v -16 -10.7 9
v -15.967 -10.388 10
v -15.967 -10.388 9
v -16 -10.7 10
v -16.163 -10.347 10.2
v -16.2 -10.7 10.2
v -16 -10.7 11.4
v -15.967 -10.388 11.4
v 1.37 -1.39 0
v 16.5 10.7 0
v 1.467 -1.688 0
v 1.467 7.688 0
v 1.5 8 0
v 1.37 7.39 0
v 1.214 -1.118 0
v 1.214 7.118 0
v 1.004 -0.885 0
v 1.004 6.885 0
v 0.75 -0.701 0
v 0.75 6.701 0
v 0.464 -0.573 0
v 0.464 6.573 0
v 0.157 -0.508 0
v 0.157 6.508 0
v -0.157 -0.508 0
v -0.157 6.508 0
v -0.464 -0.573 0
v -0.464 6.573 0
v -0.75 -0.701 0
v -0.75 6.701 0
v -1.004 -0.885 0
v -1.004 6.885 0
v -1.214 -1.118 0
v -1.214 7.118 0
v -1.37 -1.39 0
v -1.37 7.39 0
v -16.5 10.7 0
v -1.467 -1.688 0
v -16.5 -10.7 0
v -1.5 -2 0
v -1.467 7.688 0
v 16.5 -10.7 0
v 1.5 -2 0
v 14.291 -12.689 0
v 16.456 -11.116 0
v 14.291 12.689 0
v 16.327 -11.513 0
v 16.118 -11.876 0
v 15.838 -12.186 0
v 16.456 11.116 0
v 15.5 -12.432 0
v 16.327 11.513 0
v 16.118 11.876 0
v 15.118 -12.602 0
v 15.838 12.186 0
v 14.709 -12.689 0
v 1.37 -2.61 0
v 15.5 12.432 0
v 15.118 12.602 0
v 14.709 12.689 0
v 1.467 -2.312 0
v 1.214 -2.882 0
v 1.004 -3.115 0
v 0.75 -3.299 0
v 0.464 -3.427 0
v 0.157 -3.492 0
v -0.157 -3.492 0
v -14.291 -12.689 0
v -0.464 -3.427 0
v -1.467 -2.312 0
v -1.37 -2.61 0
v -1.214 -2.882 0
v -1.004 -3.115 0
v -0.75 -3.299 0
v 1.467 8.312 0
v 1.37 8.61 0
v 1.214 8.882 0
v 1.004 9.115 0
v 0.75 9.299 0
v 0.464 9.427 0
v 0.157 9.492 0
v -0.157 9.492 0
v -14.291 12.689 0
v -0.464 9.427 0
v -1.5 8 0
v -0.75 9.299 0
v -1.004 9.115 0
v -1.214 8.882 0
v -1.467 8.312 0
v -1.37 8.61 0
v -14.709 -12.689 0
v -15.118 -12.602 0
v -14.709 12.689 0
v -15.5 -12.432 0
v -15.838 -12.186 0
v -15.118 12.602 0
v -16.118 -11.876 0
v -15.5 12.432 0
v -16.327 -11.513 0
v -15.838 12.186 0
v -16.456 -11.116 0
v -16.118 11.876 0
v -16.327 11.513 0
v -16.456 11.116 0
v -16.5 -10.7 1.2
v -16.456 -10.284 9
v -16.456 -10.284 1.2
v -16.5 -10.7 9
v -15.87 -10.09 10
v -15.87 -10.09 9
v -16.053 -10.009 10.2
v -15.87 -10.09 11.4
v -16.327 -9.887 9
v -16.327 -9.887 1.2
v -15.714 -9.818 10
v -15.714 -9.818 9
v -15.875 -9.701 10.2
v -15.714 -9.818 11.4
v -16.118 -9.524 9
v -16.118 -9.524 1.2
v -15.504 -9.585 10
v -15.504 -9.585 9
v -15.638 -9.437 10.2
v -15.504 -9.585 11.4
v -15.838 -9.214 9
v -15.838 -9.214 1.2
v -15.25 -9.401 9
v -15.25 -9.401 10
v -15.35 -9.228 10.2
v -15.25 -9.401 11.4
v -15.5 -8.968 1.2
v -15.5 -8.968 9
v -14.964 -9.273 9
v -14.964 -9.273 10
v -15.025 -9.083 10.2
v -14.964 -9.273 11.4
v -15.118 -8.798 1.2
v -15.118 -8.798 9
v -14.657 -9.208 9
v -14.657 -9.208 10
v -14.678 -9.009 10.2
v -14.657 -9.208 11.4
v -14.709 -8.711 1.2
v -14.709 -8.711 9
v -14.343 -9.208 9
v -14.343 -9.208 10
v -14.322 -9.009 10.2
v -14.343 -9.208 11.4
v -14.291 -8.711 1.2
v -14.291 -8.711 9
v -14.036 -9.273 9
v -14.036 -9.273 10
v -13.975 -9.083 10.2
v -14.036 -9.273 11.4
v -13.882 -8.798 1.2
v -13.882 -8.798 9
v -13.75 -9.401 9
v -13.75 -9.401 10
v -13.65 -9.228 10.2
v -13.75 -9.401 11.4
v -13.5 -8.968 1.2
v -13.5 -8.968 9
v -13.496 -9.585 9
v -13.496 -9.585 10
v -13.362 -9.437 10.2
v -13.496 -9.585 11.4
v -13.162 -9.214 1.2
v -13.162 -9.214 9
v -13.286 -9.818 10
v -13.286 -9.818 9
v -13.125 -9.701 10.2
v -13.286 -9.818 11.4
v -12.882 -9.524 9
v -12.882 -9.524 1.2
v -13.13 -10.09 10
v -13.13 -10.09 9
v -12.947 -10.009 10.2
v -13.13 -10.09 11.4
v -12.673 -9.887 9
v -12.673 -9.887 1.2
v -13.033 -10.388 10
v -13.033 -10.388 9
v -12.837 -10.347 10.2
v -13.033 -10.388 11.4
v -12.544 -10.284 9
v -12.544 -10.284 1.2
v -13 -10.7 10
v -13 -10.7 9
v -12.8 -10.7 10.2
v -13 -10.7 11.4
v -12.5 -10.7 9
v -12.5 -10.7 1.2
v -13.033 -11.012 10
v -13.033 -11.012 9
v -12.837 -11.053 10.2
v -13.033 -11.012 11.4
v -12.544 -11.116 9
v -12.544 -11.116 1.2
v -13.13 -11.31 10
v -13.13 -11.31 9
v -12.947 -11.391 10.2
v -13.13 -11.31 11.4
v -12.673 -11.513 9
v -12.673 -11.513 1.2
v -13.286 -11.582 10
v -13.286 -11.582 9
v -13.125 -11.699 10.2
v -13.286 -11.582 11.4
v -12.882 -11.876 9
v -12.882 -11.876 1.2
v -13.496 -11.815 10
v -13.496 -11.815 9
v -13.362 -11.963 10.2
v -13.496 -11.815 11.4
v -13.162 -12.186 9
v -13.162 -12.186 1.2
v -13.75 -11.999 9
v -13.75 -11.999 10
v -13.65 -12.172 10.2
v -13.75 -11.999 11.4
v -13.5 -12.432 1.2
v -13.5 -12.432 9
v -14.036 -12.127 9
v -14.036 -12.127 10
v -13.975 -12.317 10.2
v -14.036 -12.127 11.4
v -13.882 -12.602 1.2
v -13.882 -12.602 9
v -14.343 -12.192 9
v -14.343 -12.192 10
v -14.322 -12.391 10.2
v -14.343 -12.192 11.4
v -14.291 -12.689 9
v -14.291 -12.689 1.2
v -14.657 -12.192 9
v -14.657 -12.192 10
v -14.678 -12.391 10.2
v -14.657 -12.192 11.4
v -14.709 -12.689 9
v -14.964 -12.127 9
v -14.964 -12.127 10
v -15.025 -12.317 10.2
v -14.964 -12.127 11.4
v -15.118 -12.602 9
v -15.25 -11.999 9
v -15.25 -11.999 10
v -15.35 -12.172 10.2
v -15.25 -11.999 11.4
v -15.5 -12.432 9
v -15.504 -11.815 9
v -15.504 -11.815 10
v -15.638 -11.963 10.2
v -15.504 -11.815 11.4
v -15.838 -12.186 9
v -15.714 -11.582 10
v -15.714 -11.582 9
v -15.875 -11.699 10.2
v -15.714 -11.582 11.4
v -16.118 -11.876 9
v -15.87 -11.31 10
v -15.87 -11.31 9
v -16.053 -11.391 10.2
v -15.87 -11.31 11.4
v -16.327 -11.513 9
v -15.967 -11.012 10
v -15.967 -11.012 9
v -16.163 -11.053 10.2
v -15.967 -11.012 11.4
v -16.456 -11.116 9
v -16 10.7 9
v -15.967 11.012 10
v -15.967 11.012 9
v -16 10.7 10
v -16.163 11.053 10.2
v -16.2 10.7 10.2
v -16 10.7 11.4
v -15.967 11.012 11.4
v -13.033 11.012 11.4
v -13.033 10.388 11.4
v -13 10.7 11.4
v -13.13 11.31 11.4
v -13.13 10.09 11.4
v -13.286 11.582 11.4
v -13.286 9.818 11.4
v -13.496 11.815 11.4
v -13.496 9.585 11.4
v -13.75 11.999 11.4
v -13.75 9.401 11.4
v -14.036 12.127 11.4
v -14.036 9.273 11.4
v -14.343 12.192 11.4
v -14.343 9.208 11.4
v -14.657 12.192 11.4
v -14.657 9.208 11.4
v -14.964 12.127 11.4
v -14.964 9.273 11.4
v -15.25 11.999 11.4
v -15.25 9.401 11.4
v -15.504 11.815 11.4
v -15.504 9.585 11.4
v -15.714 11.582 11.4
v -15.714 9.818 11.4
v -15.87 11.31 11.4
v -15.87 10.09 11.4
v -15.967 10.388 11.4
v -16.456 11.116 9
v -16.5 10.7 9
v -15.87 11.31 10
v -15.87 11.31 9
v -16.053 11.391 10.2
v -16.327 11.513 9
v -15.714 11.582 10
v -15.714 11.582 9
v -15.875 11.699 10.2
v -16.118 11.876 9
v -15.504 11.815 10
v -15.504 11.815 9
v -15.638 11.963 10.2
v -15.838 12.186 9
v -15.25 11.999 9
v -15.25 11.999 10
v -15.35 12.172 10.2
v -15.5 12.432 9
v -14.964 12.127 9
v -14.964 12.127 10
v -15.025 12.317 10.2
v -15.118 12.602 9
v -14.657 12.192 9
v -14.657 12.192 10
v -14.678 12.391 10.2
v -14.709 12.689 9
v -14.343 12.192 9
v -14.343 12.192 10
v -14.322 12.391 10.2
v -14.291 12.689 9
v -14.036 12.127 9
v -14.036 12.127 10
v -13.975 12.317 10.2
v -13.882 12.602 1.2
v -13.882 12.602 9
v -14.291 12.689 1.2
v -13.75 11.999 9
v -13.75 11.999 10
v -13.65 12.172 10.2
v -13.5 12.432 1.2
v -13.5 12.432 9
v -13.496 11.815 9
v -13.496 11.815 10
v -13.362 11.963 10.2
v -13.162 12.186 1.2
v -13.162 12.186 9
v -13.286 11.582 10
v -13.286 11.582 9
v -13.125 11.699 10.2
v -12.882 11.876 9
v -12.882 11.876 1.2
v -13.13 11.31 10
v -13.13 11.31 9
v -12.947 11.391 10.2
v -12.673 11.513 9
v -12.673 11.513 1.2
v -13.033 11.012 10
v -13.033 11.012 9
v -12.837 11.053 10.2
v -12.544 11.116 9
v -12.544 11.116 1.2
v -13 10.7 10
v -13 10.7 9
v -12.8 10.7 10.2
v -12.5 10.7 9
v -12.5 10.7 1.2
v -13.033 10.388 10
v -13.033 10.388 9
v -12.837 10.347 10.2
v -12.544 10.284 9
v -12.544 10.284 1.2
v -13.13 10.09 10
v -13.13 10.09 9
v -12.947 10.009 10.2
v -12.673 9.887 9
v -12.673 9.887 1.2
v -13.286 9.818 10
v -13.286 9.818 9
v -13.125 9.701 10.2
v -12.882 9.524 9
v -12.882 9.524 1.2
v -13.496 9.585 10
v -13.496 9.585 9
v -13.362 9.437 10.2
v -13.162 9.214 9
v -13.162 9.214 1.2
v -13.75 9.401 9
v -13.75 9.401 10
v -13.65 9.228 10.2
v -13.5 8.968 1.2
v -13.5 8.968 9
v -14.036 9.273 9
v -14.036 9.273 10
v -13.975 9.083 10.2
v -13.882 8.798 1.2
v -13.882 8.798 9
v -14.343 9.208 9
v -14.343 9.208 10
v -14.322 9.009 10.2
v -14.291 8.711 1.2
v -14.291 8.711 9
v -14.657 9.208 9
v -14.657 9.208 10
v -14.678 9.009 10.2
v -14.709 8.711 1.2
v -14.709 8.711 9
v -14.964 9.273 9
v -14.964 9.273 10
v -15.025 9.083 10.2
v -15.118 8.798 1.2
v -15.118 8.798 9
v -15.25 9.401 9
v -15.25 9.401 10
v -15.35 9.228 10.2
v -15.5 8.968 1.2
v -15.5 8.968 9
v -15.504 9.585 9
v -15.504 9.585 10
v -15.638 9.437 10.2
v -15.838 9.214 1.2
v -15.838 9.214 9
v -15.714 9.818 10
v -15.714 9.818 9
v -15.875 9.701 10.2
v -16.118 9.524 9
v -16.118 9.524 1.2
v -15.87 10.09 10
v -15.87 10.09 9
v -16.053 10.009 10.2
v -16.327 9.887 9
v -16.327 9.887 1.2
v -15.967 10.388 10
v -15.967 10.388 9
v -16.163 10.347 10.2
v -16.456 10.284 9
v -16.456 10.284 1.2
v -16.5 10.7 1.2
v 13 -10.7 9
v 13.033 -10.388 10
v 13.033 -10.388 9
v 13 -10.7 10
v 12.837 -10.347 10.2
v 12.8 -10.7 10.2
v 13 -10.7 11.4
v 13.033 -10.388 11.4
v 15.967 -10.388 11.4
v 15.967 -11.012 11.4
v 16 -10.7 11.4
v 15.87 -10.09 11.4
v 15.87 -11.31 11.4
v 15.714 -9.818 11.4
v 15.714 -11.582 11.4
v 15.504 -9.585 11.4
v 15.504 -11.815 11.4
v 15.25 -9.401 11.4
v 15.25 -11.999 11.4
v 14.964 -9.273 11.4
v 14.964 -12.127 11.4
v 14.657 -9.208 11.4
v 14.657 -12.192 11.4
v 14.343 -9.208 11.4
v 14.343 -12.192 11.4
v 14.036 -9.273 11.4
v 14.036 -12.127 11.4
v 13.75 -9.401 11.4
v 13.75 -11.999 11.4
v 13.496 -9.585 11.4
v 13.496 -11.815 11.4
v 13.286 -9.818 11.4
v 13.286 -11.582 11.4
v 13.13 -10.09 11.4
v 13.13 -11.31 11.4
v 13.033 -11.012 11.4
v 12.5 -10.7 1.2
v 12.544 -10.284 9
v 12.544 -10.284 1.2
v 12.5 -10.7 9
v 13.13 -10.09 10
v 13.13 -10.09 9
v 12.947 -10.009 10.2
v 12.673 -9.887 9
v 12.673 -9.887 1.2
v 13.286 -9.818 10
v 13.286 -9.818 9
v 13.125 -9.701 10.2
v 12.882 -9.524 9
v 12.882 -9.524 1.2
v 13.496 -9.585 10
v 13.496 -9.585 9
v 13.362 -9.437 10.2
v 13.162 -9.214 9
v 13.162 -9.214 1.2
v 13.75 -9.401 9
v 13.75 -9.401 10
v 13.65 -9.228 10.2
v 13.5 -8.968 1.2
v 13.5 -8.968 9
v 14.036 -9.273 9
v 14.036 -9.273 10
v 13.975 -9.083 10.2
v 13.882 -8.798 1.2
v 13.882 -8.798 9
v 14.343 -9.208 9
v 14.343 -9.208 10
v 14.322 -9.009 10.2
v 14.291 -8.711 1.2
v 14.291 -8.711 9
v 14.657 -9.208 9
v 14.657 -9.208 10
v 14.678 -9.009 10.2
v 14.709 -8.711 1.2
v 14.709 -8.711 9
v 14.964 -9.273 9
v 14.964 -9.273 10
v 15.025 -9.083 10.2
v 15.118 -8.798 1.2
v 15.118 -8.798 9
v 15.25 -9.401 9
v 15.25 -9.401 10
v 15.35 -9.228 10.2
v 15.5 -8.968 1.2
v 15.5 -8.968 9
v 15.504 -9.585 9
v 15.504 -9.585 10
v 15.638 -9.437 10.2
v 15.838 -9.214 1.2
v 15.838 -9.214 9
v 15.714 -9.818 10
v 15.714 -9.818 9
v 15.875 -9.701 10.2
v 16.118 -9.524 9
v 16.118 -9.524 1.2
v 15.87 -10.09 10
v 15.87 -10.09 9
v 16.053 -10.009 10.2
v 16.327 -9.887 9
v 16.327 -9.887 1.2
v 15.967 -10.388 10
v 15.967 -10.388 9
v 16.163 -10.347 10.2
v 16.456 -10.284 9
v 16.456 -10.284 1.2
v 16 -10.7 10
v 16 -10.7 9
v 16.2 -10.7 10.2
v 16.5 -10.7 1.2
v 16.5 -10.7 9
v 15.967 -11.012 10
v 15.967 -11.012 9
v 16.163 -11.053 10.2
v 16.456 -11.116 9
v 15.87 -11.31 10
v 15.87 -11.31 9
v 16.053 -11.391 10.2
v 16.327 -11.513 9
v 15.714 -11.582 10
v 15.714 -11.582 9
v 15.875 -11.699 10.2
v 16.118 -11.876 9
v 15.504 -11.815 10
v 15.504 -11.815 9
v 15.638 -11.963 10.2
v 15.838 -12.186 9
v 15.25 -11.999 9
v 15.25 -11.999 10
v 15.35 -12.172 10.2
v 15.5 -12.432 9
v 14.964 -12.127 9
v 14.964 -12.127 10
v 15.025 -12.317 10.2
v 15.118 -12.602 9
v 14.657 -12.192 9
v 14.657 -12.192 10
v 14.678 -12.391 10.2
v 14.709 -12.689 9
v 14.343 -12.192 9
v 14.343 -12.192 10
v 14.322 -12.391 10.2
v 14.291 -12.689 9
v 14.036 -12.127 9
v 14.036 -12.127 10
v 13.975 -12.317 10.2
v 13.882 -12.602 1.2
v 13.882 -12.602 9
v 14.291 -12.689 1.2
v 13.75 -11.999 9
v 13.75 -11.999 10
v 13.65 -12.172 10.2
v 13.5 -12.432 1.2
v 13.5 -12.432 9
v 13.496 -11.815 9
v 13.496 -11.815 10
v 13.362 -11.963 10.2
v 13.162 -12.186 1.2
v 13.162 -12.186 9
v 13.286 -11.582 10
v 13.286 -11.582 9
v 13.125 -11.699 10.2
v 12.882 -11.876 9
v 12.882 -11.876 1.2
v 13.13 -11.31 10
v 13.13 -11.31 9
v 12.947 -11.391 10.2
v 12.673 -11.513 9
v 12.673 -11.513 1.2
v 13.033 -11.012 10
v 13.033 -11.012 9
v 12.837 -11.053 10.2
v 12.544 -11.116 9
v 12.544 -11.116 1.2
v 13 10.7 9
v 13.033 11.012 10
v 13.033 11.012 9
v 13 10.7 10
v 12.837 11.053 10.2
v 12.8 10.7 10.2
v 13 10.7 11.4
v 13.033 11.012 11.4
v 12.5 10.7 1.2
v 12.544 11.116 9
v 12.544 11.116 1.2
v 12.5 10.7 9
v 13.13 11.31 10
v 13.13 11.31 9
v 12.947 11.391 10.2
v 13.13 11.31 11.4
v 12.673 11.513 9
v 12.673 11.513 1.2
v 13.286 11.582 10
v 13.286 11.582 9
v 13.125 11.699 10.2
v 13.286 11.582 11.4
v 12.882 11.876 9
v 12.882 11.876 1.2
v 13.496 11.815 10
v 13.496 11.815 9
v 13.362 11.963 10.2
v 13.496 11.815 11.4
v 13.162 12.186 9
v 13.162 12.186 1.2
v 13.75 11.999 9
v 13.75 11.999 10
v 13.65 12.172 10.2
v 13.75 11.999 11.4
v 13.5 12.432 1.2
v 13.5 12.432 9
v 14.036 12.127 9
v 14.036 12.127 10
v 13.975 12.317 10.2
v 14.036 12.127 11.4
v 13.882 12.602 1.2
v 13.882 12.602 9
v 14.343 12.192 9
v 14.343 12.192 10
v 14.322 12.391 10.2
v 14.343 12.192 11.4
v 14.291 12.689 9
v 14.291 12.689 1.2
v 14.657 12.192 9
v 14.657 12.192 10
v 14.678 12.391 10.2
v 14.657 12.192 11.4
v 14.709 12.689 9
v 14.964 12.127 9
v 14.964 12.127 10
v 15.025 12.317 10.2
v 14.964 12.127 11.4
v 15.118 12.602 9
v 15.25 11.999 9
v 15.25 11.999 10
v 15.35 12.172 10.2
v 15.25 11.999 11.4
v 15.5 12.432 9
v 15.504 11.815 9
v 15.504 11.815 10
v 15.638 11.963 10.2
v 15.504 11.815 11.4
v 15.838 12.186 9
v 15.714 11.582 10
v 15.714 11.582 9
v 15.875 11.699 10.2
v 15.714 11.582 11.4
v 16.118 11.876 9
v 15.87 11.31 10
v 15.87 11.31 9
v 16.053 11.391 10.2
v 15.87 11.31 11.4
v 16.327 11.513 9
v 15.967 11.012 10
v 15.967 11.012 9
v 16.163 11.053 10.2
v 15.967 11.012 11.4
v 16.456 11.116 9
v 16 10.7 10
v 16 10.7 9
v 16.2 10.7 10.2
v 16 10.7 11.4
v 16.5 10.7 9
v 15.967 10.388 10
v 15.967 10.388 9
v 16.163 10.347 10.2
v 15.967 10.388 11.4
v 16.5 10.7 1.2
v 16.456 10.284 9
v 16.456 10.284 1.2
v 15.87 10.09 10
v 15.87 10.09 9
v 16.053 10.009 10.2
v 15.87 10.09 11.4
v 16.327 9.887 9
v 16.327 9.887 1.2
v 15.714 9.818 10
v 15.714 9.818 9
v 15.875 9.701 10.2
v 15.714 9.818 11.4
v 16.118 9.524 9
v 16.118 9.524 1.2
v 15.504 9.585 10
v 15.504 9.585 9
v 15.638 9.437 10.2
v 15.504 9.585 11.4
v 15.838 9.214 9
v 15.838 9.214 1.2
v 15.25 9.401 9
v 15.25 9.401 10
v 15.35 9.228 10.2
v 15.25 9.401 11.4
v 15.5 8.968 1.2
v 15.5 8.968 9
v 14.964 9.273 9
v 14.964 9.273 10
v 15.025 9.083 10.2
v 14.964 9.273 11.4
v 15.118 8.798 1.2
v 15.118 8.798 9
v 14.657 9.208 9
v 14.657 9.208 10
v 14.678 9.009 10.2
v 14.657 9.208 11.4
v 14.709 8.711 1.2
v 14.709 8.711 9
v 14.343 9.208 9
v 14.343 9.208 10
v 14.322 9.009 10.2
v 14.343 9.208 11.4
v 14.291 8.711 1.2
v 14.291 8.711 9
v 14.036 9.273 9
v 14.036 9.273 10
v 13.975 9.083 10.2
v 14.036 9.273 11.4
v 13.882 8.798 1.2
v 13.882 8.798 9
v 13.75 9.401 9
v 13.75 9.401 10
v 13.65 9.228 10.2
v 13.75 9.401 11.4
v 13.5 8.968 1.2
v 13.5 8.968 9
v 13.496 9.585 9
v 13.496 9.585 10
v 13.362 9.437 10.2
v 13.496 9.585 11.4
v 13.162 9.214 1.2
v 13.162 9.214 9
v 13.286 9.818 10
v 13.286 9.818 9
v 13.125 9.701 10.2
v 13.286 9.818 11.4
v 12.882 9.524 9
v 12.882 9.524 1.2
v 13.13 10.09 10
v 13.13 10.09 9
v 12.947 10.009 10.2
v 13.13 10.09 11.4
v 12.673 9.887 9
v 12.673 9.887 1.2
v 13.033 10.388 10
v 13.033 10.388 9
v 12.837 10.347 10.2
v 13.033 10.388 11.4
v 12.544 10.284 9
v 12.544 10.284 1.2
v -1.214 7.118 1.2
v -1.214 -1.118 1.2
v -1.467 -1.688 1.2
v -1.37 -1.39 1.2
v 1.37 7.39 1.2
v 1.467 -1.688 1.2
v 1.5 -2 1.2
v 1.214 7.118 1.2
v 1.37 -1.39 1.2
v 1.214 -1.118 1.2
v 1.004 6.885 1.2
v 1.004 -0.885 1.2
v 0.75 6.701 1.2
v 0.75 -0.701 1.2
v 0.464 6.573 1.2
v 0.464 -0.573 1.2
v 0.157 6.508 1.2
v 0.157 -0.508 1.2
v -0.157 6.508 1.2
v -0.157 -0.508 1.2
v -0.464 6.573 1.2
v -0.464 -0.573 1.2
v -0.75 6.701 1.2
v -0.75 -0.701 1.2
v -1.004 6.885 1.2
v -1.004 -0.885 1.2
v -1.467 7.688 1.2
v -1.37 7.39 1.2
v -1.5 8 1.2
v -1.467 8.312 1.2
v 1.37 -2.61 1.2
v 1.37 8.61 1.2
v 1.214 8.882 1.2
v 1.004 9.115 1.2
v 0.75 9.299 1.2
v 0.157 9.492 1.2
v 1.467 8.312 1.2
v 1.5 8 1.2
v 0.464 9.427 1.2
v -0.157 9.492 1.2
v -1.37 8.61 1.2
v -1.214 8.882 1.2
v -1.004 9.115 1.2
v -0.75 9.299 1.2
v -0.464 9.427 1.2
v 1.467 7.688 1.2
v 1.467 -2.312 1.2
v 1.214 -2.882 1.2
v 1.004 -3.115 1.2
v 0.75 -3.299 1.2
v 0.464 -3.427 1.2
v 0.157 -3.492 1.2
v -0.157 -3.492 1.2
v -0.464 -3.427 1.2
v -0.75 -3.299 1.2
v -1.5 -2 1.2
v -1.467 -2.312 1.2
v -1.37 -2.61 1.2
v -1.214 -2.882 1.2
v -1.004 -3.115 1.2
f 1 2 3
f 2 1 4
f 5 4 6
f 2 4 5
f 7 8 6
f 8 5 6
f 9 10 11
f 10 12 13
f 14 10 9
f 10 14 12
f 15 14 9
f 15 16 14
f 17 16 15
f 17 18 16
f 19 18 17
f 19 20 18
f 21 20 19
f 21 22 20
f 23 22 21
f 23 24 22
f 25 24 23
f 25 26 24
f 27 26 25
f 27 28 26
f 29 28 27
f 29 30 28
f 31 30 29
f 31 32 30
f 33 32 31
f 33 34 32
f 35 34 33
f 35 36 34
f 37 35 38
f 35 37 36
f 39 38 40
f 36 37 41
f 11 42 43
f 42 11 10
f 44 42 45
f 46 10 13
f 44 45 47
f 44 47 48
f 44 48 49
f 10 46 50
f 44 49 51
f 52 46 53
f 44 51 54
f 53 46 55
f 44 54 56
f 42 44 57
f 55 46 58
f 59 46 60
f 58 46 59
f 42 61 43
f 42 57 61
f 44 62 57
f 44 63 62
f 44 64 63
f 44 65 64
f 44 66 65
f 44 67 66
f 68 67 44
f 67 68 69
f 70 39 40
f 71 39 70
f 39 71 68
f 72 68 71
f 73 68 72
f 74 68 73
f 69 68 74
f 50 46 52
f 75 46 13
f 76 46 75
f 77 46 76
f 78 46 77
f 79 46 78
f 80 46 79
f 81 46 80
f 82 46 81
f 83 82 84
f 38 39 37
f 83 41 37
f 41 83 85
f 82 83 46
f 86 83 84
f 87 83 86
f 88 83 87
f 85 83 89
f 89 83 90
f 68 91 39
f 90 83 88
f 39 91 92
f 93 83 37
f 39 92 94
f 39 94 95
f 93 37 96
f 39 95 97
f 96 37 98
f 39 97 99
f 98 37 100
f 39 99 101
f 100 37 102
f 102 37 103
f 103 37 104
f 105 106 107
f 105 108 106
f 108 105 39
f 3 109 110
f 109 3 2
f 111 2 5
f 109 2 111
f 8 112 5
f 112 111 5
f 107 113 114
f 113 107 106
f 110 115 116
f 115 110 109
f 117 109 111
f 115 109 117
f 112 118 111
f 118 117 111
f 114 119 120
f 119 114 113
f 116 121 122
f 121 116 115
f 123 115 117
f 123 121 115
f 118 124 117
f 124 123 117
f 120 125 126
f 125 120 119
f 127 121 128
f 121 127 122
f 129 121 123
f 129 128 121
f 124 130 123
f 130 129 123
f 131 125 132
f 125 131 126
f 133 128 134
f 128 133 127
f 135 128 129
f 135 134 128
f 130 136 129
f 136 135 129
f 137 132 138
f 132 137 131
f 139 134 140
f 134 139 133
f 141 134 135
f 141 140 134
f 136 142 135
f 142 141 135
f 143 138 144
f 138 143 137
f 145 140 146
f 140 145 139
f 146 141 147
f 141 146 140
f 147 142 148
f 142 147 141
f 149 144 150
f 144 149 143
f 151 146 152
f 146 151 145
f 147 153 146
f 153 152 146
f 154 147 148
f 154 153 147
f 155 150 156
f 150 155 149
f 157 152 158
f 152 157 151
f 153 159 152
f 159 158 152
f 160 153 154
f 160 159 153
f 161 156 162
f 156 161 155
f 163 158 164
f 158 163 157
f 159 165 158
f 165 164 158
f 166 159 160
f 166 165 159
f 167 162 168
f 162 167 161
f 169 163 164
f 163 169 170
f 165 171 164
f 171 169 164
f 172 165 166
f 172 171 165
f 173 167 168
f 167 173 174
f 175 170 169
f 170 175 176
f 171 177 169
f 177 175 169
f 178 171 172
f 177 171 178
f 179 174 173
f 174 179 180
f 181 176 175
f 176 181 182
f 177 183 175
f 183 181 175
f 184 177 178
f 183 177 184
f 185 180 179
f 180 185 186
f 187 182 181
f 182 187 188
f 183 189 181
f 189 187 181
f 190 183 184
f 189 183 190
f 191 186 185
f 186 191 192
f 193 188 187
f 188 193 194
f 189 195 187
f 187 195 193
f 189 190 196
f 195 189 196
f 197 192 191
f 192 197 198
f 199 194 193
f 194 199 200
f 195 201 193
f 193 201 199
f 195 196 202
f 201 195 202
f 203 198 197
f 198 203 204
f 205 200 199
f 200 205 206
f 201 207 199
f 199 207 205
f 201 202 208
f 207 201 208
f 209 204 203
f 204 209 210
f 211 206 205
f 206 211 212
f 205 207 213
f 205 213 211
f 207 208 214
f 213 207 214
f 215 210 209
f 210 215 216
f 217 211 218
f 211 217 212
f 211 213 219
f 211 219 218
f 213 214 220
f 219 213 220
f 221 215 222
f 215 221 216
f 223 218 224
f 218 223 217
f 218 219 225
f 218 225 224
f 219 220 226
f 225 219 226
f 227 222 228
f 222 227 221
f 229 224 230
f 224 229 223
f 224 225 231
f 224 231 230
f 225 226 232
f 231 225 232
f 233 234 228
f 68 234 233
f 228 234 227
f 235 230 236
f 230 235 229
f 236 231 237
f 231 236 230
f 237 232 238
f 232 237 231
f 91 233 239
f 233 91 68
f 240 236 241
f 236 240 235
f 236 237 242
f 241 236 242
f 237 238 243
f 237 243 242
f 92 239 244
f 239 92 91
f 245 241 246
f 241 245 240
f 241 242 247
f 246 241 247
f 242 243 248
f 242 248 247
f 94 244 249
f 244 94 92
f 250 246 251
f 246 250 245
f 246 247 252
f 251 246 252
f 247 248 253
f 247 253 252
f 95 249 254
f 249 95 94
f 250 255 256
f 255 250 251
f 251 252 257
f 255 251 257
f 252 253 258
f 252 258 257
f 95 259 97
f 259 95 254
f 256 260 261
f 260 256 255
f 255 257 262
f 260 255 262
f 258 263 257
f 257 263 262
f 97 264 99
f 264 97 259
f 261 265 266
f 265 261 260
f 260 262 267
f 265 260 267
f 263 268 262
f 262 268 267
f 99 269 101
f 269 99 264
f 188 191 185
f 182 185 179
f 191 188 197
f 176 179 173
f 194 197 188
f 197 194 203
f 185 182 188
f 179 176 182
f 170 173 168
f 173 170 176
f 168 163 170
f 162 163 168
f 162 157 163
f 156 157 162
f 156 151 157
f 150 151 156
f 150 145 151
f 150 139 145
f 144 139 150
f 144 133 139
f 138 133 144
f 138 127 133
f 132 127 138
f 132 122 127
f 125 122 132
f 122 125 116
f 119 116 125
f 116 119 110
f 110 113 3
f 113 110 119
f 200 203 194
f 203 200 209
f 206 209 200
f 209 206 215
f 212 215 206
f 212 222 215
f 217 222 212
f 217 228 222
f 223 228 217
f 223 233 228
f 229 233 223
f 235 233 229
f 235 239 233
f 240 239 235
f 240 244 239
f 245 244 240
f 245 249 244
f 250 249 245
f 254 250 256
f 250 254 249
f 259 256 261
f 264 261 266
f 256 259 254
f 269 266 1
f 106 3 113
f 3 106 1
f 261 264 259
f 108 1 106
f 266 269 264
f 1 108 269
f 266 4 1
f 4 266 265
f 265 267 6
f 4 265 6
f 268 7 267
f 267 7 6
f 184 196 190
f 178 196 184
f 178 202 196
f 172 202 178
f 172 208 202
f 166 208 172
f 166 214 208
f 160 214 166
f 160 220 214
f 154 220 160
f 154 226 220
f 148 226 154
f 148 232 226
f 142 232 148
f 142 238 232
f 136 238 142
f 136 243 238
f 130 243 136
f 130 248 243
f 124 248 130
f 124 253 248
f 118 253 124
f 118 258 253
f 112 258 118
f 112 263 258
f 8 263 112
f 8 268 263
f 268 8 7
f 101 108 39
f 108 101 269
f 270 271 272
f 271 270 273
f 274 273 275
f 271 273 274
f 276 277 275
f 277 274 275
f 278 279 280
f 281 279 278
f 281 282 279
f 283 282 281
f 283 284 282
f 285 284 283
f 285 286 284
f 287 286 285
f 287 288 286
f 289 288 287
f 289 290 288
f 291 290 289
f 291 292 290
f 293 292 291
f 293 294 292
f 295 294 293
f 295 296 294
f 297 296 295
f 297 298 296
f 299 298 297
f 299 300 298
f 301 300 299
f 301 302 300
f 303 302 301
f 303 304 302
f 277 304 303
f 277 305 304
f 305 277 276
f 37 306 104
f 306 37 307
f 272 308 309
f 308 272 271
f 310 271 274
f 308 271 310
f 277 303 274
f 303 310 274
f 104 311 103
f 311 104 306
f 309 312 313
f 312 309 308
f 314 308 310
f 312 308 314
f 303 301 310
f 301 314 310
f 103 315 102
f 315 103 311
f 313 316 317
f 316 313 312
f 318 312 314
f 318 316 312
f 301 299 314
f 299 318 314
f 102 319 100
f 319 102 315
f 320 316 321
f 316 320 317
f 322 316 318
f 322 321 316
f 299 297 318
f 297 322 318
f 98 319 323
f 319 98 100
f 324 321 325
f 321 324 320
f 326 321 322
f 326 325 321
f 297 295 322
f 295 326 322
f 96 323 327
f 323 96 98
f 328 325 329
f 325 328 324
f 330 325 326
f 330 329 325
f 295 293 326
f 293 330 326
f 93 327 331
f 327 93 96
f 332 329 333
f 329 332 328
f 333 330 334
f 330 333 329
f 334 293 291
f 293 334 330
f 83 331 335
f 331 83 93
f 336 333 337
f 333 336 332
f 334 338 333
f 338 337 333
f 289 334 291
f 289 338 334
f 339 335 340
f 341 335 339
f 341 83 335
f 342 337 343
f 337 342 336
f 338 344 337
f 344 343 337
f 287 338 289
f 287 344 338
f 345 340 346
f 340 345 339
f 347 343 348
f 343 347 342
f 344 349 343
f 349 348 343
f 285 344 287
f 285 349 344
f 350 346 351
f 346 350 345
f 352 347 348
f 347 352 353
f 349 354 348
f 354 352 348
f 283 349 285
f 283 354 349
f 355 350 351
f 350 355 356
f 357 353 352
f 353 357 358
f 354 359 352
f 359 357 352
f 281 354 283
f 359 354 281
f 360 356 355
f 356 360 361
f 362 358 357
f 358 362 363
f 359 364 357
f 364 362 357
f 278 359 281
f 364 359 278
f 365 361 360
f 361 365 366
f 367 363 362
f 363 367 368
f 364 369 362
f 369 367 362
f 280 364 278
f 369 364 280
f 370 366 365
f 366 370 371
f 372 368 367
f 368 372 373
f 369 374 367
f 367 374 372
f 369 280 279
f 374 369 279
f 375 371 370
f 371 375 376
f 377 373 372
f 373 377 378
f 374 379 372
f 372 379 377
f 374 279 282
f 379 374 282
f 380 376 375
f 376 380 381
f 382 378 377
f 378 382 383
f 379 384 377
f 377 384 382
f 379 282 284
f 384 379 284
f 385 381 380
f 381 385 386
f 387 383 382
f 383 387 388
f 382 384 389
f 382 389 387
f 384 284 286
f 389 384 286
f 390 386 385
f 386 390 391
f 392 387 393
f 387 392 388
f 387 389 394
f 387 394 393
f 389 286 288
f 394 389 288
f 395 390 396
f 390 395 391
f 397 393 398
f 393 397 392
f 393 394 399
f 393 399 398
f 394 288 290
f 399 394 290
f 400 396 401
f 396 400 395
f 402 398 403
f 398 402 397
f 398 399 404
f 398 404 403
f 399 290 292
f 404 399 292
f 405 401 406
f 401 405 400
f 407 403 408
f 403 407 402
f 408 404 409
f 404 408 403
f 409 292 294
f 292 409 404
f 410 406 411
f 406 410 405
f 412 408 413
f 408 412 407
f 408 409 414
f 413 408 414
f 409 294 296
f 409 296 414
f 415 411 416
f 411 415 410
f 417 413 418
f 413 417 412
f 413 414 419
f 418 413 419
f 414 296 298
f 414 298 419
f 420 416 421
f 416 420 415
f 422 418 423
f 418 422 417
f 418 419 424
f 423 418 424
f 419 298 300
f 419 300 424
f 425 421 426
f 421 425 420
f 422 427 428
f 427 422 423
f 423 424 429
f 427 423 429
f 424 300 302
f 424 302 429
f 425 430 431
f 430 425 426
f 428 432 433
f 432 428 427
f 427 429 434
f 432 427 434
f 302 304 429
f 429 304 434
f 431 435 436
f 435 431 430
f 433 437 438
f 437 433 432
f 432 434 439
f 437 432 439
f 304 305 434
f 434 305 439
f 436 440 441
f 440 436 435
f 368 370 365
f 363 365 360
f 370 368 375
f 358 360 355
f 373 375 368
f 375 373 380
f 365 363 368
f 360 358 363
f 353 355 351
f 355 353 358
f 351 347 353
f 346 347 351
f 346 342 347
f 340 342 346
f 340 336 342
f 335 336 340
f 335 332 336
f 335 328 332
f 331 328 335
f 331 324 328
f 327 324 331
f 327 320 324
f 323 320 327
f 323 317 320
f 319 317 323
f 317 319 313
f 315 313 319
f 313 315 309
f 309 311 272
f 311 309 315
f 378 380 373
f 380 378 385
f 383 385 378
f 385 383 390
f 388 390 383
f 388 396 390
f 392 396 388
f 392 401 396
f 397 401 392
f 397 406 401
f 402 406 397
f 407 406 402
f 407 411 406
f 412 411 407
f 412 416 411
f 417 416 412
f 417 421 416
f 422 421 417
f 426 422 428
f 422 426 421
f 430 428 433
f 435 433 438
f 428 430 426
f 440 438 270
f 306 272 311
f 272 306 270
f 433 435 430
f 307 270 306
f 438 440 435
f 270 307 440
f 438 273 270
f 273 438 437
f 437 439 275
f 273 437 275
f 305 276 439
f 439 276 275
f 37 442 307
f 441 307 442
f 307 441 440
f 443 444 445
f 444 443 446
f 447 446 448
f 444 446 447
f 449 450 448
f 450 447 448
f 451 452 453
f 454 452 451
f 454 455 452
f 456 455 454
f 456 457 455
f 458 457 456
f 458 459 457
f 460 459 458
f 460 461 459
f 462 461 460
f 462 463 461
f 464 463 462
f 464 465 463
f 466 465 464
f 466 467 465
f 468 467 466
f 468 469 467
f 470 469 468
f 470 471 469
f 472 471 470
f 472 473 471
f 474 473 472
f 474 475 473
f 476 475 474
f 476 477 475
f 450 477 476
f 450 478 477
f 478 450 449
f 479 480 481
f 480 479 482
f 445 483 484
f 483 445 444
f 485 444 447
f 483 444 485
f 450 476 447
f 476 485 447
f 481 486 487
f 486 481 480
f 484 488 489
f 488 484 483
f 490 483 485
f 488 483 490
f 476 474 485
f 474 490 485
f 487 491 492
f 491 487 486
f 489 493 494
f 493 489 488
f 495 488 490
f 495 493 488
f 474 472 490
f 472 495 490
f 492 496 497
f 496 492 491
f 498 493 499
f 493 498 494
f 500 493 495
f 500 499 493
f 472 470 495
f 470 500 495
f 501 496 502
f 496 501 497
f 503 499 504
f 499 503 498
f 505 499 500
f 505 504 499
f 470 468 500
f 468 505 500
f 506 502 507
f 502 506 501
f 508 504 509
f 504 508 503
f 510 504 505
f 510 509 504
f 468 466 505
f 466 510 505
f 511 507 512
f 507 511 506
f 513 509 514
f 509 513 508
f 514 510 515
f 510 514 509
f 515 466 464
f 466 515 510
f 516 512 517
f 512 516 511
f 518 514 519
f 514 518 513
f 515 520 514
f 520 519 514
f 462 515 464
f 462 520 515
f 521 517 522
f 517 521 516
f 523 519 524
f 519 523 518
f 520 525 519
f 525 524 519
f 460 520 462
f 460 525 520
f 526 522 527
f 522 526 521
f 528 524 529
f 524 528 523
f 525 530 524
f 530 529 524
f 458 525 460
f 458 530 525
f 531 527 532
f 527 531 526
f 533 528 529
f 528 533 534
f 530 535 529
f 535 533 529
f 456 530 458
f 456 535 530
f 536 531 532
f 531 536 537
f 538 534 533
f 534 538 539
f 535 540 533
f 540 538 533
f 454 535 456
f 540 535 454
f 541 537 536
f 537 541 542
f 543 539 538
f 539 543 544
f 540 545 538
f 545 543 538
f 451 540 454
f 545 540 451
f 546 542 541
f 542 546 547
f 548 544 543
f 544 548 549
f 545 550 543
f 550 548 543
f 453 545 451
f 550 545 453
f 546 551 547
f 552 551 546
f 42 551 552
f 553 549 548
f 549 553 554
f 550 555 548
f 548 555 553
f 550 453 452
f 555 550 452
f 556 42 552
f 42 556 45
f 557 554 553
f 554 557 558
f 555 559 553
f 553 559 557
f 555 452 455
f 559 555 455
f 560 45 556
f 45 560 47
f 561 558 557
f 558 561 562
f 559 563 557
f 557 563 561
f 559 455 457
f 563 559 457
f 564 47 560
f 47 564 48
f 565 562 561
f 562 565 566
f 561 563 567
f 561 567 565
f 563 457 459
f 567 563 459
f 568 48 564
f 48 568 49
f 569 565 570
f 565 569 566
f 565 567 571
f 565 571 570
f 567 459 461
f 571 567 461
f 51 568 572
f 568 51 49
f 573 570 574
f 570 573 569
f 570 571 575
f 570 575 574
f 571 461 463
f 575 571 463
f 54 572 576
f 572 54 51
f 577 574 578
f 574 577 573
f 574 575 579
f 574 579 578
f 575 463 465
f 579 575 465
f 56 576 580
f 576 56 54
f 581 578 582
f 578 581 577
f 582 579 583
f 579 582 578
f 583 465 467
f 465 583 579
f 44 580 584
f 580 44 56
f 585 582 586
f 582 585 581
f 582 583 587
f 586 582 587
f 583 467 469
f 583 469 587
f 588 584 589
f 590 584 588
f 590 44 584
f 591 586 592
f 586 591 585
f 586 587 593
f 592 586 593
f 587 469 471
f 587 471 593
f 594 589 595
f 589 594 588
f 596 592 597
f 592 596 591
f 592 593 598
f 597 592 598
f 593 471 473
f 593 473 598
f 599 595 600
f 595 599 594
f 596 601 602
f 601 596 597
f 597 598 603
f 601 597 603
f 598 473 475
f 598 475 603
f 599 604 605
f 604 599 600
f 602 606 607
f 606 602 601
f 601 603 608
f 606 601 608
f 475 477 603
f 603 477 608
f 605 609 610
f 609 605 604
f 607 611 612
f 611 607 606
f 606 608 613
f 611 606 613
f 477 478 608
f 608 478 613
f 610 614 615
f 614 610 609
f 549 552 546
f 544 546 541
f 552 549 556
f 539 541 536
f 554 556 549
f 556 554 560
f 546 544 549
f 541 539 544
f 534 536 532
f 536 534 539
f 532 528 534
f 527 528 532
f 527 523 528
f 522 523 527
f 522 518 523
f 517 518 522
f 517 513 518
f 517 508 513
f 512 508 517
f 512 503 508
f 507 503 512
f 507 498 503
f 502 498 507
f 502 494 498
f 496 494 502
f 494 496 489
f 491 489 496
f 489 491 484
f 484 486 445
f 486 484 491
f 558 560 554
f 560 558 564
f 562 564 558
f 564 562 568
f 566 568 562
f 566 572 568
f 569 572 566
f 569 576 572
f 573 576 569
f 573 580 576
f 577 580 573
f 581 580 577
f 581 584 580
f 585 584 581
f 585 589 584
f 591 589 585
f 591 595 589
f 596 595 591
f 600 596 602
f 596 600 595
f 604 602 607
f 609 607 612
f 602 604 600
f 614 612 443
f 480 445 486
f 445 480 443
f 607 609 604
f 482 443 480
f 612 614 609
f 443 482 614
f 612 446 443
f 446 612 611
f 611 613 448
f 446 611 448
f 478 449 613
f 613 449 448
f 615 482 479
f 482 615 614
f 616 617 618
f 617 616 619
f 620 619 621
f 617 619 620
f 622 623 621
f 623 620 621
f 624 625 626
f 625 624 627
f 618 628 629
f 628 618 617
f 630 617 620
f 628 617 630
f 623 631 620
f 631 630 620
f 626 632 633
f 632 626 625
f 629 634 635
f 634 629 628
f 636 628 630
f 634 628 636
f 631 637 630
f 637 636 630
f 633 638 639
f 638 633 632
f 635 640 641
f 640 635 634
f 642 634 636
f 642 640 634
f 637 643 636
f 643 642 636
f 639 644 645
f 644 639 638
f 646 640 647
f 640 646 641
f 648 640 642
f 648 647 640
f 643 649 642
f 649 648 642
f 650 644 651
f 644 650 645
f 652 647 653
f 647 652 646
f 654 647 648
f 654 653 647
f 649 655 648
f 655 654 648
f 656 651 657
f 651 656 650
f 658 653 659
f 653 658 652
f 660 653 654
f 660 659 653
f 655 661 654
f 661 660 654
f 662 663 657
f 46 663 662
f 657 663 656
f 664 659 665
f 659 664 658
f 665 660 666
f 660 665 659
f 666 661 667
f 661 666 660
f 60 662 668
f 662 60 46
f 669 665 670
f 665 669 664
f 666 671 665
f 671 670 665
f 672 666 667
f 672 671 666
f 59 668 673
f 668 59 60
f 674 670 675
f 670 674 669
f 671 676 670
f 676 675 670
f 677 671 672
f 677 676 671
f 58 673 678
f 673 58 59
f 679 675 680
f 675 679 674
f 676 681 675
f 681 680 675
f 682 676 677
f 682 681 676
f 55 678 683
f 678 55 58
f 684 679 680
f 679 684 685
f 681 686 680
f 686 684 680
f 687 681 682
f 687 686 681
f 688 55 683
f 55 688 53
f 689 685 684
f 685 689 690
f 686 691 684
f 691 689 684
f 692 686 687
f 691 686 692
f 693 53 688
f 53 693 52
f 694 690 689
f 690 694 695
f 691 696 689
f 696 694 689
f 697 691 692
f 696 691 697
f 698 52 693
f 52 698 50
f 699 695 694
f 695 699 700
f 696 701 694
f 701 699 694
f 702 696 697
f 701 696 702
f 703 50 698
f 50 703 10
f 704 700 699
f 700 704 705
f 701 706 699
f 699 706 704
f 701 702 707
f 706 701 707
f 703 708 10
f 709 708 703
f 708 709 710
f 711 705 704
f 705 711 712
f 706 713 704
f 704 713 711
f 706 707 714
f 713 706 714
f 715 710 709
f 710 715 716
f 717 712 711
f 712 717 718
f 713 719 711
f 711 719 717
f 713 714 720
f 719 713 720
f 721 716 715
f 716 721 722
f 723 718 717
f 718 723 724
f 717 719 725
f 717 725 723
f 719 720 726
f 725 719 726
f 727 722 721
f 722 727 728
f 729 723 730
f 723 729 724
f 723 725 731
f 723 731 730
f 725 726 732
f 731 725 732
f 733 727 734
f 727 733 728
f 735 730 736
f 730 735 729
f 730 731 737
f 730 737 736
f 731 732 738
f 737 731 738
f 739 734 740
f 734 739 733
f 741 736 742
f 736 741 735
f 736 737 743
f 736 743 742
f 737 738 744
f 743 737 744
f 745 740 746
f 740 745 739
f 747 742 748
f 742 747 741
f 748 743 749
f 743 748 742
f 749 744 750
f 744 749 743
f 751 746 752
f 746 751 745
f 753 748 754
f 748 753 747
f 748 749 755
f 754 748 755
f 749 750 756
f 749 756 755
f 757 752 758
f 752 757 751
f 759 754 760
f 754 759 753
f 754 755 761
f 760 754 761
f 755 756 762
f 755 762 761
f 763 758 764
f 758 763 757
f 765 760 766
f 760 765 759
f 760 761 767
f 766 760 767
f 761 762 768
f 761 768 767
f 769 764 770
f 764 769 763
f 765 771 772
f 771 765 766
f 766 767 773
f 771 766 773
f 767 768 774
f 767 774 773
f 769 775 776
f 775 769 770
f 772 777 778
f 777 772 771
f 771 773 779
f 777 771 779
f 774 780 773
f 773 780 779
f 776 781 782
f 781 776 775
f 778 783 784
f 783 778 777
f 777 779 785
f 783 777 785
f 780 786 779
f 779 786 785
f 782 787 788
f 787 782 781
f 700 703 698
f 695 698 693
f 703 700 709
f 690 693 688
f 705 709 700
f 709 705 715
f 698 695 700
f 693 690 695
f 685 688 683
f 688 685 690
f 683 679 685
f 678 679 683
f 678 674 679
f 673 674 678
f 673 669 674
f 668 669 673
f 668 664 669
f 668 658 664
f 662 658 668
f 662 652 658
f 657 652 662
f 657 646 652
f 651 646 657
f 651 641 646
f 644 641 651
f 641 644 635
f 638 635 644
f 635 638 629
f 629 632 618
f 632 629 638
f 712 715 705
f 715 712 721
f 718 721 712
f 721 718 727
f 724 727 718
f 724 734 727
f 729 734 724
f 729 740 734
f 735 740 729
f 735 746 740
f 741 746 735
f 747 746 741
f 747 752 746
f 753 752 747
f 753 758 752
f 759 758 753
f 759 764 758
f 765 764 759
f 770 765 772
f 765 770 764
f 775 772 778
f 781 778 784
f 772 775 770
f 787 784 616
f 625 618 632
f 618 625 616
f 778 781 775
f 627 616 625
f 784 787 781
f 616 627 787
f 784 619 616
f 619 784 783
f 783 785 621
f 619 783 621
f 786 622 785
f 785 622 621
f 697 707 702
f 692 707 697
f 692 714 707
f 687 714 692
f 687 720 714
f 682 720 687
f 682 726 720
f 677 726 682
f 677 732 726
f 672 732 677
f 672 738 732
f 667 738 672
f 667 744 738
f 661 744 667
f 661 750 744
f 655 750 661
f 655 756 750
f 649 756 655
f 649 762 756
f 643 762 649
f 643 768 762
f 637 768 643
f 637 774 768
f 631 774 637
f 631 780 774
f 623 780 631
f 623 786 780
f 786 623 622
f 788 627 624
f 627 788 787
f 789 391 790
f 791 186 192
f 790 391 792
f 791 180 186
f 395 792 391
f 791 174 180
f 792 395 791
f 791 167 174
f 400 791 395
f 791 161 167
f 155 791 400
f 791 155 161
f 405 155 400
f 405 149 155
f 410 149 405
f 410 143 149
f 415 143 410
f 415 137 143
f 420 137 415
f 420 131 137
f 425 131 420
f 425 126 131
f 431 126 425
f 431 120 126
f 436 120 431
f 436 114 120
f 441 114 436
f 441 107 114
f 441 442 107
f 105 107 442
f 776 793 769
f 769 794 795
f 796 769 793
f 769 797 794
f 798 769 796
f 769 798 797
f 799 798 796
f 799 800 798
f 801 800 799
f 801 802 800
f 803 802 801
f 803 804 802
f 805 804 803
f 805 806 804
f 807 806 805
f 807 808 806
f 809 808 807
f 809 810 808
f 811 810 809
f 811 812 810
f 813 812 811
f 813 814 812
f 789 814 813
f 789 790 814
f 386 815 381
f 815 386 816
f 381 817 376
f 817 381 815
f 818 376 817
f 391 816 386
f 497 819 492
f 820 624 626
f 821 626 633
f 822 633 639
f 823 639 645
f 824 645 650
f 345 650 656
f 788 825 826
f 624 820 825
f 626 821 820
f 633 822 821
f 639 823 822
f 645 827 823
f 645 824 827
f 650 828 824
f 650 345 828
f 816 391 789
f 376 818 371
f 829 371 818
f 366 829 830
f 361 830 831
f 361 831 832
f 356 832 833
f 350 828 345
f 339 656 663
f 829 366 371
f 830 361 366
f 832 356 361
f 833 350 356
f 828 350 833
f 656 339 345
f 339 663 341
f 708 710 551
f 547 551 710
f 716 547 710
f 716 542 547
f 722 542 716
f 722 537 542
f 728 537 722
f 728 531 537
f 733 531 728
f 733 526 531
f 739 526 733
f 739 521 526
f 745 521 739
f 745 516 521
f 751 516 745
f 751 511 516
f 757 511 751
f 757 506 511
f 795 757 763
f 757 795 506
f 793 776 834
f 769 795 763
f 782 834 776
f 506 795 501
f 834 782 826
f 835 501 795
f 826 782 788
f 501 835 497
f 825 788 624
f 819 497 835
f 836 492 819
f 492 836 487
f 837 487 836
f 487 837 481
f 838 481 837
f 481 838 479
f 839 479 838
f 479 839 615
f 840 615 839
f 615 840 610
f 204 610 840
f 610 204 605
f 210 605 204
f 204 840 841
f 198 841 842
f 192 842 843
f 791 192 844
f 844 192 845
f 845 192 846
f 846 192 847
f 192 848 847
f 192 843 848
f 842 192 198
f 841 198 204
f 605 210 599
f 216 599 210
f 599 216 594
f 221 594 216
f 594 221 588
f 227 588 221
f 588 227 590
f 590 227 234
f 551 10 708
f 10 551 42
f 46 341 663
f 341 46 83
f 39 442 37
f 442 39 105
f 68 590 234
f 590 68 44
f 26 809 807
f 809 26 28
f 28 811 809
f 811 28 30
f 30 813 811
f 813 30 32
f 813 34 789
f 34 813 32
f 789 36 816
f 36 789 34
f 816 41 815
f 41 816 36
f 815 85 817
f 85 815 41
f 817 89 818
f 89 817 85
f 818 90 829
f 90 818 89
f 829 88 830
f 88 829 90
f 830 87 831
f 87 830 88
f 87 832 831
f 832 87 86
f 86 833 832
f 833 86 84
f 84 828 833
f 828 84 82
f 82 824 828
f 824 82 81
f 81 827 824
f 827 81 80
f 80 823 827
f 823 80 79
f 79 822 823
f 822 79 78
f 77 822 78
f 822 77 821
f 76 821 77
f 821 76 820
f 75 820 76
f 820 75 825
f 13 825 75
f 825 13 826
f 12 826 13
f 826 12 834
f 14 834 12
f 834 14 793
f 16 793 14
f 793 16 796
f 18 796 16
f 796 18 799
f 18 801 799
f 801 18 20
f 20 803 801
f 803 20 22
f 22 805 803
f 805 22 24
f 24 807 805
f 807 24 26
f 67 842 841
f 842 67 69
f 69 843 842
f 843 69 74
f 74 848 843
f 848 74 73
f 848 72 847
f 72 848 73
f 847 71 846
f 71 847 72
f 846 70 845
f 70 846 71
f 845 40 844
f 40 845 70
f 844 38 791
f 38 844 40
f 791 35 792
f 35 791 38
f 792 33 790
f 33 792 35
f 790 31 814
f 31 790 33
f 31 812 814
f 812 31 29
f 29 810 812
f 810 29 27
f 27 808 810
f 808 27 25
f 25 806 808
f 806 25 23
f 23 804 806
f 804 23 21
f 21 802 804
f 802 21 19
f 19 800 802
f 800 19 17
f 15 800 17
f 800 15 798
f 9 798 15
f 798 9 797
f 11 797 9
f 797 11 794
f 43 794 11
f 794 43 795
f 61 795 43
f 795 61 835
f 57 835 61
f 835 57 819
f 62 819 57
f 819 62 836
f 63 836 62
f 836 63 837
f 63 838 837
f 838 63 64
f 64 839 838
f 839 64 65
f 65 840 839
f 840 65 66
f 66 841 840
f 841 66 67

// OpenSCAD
// Mount for Relay Module in European-style Junction Box
// Adrian McCarthy 2023-08-28
//
// European screw terminal strips have holes between each connection that
// fit over vertical pins at the bottom of the junction box.  I want to
// mount a single relay module there instead.  This part holds the relay
// module just above the box's pins.
//
// Designed for
// junction box:  https://www.amazon.com/gp/product/B07FDKH4G3
// relay module:  https://www.amazon.com/gp/product/B07BVXT1ZK
//
// I like the junction box.  I'm not sure I'd recommend this relay module.

nozzle_d = 0.4;
th = 1.2;

// The jbox
pin_d = 3;
pin_h = 9;
pin_spacing = 10;
pin_bias = 3;

// The relay module
module_w = 25.4;
module_l = 33.0;
module_th = 1;
screw_d = 3;
screw_r = screw_d/2;
screw_offset = 0.5;  // inward from edges
boss_d = screw_d + 1;
boss_r = boss_d/2;

dx = (module_l - 2*screw_offset - 2*screw_r) / 2;
dy = (module_w - 2*screw_offset - 2*screw_r) / 2;

module corners() {
    translate([-dx, -dy]) children();
    translate([-dx,  dy]) children();
    translate([ dx, -dy]) children();
    translate([ dx,  dy]) children();
}

module standoff() {
    rotate_extrude(convexity=6, $fs=nozzle_d/2)
        polygon([
            [0, 0],
            [boss_r, 0],
            [boss_r, pin_h],
            [screw_r, pin_h],
            [screw_r, pin_h + module_th],
            [screw_r + 0.2, pin_h + module_th + 0.2],
            [screw_r, pin_h + module_th + 0.2 + th],
            [0, pin_h + module_th + 0.2 + th]
        ]);
}

linear_extrude(th, convexity=6) {
    difference() {
        hull() corners() circle(d=boss_d, $fs=nozzle_d/2);
        translate([0, pin_bias-pin_spacing/2]) circle(d=pin_d, $fs=nozzle_d/2);
        translate([0, pin_bias+pin_spacing/2]) circle(d=pin_d, $fs=nozzle_d/2);
    }
}

corners() standoff();
